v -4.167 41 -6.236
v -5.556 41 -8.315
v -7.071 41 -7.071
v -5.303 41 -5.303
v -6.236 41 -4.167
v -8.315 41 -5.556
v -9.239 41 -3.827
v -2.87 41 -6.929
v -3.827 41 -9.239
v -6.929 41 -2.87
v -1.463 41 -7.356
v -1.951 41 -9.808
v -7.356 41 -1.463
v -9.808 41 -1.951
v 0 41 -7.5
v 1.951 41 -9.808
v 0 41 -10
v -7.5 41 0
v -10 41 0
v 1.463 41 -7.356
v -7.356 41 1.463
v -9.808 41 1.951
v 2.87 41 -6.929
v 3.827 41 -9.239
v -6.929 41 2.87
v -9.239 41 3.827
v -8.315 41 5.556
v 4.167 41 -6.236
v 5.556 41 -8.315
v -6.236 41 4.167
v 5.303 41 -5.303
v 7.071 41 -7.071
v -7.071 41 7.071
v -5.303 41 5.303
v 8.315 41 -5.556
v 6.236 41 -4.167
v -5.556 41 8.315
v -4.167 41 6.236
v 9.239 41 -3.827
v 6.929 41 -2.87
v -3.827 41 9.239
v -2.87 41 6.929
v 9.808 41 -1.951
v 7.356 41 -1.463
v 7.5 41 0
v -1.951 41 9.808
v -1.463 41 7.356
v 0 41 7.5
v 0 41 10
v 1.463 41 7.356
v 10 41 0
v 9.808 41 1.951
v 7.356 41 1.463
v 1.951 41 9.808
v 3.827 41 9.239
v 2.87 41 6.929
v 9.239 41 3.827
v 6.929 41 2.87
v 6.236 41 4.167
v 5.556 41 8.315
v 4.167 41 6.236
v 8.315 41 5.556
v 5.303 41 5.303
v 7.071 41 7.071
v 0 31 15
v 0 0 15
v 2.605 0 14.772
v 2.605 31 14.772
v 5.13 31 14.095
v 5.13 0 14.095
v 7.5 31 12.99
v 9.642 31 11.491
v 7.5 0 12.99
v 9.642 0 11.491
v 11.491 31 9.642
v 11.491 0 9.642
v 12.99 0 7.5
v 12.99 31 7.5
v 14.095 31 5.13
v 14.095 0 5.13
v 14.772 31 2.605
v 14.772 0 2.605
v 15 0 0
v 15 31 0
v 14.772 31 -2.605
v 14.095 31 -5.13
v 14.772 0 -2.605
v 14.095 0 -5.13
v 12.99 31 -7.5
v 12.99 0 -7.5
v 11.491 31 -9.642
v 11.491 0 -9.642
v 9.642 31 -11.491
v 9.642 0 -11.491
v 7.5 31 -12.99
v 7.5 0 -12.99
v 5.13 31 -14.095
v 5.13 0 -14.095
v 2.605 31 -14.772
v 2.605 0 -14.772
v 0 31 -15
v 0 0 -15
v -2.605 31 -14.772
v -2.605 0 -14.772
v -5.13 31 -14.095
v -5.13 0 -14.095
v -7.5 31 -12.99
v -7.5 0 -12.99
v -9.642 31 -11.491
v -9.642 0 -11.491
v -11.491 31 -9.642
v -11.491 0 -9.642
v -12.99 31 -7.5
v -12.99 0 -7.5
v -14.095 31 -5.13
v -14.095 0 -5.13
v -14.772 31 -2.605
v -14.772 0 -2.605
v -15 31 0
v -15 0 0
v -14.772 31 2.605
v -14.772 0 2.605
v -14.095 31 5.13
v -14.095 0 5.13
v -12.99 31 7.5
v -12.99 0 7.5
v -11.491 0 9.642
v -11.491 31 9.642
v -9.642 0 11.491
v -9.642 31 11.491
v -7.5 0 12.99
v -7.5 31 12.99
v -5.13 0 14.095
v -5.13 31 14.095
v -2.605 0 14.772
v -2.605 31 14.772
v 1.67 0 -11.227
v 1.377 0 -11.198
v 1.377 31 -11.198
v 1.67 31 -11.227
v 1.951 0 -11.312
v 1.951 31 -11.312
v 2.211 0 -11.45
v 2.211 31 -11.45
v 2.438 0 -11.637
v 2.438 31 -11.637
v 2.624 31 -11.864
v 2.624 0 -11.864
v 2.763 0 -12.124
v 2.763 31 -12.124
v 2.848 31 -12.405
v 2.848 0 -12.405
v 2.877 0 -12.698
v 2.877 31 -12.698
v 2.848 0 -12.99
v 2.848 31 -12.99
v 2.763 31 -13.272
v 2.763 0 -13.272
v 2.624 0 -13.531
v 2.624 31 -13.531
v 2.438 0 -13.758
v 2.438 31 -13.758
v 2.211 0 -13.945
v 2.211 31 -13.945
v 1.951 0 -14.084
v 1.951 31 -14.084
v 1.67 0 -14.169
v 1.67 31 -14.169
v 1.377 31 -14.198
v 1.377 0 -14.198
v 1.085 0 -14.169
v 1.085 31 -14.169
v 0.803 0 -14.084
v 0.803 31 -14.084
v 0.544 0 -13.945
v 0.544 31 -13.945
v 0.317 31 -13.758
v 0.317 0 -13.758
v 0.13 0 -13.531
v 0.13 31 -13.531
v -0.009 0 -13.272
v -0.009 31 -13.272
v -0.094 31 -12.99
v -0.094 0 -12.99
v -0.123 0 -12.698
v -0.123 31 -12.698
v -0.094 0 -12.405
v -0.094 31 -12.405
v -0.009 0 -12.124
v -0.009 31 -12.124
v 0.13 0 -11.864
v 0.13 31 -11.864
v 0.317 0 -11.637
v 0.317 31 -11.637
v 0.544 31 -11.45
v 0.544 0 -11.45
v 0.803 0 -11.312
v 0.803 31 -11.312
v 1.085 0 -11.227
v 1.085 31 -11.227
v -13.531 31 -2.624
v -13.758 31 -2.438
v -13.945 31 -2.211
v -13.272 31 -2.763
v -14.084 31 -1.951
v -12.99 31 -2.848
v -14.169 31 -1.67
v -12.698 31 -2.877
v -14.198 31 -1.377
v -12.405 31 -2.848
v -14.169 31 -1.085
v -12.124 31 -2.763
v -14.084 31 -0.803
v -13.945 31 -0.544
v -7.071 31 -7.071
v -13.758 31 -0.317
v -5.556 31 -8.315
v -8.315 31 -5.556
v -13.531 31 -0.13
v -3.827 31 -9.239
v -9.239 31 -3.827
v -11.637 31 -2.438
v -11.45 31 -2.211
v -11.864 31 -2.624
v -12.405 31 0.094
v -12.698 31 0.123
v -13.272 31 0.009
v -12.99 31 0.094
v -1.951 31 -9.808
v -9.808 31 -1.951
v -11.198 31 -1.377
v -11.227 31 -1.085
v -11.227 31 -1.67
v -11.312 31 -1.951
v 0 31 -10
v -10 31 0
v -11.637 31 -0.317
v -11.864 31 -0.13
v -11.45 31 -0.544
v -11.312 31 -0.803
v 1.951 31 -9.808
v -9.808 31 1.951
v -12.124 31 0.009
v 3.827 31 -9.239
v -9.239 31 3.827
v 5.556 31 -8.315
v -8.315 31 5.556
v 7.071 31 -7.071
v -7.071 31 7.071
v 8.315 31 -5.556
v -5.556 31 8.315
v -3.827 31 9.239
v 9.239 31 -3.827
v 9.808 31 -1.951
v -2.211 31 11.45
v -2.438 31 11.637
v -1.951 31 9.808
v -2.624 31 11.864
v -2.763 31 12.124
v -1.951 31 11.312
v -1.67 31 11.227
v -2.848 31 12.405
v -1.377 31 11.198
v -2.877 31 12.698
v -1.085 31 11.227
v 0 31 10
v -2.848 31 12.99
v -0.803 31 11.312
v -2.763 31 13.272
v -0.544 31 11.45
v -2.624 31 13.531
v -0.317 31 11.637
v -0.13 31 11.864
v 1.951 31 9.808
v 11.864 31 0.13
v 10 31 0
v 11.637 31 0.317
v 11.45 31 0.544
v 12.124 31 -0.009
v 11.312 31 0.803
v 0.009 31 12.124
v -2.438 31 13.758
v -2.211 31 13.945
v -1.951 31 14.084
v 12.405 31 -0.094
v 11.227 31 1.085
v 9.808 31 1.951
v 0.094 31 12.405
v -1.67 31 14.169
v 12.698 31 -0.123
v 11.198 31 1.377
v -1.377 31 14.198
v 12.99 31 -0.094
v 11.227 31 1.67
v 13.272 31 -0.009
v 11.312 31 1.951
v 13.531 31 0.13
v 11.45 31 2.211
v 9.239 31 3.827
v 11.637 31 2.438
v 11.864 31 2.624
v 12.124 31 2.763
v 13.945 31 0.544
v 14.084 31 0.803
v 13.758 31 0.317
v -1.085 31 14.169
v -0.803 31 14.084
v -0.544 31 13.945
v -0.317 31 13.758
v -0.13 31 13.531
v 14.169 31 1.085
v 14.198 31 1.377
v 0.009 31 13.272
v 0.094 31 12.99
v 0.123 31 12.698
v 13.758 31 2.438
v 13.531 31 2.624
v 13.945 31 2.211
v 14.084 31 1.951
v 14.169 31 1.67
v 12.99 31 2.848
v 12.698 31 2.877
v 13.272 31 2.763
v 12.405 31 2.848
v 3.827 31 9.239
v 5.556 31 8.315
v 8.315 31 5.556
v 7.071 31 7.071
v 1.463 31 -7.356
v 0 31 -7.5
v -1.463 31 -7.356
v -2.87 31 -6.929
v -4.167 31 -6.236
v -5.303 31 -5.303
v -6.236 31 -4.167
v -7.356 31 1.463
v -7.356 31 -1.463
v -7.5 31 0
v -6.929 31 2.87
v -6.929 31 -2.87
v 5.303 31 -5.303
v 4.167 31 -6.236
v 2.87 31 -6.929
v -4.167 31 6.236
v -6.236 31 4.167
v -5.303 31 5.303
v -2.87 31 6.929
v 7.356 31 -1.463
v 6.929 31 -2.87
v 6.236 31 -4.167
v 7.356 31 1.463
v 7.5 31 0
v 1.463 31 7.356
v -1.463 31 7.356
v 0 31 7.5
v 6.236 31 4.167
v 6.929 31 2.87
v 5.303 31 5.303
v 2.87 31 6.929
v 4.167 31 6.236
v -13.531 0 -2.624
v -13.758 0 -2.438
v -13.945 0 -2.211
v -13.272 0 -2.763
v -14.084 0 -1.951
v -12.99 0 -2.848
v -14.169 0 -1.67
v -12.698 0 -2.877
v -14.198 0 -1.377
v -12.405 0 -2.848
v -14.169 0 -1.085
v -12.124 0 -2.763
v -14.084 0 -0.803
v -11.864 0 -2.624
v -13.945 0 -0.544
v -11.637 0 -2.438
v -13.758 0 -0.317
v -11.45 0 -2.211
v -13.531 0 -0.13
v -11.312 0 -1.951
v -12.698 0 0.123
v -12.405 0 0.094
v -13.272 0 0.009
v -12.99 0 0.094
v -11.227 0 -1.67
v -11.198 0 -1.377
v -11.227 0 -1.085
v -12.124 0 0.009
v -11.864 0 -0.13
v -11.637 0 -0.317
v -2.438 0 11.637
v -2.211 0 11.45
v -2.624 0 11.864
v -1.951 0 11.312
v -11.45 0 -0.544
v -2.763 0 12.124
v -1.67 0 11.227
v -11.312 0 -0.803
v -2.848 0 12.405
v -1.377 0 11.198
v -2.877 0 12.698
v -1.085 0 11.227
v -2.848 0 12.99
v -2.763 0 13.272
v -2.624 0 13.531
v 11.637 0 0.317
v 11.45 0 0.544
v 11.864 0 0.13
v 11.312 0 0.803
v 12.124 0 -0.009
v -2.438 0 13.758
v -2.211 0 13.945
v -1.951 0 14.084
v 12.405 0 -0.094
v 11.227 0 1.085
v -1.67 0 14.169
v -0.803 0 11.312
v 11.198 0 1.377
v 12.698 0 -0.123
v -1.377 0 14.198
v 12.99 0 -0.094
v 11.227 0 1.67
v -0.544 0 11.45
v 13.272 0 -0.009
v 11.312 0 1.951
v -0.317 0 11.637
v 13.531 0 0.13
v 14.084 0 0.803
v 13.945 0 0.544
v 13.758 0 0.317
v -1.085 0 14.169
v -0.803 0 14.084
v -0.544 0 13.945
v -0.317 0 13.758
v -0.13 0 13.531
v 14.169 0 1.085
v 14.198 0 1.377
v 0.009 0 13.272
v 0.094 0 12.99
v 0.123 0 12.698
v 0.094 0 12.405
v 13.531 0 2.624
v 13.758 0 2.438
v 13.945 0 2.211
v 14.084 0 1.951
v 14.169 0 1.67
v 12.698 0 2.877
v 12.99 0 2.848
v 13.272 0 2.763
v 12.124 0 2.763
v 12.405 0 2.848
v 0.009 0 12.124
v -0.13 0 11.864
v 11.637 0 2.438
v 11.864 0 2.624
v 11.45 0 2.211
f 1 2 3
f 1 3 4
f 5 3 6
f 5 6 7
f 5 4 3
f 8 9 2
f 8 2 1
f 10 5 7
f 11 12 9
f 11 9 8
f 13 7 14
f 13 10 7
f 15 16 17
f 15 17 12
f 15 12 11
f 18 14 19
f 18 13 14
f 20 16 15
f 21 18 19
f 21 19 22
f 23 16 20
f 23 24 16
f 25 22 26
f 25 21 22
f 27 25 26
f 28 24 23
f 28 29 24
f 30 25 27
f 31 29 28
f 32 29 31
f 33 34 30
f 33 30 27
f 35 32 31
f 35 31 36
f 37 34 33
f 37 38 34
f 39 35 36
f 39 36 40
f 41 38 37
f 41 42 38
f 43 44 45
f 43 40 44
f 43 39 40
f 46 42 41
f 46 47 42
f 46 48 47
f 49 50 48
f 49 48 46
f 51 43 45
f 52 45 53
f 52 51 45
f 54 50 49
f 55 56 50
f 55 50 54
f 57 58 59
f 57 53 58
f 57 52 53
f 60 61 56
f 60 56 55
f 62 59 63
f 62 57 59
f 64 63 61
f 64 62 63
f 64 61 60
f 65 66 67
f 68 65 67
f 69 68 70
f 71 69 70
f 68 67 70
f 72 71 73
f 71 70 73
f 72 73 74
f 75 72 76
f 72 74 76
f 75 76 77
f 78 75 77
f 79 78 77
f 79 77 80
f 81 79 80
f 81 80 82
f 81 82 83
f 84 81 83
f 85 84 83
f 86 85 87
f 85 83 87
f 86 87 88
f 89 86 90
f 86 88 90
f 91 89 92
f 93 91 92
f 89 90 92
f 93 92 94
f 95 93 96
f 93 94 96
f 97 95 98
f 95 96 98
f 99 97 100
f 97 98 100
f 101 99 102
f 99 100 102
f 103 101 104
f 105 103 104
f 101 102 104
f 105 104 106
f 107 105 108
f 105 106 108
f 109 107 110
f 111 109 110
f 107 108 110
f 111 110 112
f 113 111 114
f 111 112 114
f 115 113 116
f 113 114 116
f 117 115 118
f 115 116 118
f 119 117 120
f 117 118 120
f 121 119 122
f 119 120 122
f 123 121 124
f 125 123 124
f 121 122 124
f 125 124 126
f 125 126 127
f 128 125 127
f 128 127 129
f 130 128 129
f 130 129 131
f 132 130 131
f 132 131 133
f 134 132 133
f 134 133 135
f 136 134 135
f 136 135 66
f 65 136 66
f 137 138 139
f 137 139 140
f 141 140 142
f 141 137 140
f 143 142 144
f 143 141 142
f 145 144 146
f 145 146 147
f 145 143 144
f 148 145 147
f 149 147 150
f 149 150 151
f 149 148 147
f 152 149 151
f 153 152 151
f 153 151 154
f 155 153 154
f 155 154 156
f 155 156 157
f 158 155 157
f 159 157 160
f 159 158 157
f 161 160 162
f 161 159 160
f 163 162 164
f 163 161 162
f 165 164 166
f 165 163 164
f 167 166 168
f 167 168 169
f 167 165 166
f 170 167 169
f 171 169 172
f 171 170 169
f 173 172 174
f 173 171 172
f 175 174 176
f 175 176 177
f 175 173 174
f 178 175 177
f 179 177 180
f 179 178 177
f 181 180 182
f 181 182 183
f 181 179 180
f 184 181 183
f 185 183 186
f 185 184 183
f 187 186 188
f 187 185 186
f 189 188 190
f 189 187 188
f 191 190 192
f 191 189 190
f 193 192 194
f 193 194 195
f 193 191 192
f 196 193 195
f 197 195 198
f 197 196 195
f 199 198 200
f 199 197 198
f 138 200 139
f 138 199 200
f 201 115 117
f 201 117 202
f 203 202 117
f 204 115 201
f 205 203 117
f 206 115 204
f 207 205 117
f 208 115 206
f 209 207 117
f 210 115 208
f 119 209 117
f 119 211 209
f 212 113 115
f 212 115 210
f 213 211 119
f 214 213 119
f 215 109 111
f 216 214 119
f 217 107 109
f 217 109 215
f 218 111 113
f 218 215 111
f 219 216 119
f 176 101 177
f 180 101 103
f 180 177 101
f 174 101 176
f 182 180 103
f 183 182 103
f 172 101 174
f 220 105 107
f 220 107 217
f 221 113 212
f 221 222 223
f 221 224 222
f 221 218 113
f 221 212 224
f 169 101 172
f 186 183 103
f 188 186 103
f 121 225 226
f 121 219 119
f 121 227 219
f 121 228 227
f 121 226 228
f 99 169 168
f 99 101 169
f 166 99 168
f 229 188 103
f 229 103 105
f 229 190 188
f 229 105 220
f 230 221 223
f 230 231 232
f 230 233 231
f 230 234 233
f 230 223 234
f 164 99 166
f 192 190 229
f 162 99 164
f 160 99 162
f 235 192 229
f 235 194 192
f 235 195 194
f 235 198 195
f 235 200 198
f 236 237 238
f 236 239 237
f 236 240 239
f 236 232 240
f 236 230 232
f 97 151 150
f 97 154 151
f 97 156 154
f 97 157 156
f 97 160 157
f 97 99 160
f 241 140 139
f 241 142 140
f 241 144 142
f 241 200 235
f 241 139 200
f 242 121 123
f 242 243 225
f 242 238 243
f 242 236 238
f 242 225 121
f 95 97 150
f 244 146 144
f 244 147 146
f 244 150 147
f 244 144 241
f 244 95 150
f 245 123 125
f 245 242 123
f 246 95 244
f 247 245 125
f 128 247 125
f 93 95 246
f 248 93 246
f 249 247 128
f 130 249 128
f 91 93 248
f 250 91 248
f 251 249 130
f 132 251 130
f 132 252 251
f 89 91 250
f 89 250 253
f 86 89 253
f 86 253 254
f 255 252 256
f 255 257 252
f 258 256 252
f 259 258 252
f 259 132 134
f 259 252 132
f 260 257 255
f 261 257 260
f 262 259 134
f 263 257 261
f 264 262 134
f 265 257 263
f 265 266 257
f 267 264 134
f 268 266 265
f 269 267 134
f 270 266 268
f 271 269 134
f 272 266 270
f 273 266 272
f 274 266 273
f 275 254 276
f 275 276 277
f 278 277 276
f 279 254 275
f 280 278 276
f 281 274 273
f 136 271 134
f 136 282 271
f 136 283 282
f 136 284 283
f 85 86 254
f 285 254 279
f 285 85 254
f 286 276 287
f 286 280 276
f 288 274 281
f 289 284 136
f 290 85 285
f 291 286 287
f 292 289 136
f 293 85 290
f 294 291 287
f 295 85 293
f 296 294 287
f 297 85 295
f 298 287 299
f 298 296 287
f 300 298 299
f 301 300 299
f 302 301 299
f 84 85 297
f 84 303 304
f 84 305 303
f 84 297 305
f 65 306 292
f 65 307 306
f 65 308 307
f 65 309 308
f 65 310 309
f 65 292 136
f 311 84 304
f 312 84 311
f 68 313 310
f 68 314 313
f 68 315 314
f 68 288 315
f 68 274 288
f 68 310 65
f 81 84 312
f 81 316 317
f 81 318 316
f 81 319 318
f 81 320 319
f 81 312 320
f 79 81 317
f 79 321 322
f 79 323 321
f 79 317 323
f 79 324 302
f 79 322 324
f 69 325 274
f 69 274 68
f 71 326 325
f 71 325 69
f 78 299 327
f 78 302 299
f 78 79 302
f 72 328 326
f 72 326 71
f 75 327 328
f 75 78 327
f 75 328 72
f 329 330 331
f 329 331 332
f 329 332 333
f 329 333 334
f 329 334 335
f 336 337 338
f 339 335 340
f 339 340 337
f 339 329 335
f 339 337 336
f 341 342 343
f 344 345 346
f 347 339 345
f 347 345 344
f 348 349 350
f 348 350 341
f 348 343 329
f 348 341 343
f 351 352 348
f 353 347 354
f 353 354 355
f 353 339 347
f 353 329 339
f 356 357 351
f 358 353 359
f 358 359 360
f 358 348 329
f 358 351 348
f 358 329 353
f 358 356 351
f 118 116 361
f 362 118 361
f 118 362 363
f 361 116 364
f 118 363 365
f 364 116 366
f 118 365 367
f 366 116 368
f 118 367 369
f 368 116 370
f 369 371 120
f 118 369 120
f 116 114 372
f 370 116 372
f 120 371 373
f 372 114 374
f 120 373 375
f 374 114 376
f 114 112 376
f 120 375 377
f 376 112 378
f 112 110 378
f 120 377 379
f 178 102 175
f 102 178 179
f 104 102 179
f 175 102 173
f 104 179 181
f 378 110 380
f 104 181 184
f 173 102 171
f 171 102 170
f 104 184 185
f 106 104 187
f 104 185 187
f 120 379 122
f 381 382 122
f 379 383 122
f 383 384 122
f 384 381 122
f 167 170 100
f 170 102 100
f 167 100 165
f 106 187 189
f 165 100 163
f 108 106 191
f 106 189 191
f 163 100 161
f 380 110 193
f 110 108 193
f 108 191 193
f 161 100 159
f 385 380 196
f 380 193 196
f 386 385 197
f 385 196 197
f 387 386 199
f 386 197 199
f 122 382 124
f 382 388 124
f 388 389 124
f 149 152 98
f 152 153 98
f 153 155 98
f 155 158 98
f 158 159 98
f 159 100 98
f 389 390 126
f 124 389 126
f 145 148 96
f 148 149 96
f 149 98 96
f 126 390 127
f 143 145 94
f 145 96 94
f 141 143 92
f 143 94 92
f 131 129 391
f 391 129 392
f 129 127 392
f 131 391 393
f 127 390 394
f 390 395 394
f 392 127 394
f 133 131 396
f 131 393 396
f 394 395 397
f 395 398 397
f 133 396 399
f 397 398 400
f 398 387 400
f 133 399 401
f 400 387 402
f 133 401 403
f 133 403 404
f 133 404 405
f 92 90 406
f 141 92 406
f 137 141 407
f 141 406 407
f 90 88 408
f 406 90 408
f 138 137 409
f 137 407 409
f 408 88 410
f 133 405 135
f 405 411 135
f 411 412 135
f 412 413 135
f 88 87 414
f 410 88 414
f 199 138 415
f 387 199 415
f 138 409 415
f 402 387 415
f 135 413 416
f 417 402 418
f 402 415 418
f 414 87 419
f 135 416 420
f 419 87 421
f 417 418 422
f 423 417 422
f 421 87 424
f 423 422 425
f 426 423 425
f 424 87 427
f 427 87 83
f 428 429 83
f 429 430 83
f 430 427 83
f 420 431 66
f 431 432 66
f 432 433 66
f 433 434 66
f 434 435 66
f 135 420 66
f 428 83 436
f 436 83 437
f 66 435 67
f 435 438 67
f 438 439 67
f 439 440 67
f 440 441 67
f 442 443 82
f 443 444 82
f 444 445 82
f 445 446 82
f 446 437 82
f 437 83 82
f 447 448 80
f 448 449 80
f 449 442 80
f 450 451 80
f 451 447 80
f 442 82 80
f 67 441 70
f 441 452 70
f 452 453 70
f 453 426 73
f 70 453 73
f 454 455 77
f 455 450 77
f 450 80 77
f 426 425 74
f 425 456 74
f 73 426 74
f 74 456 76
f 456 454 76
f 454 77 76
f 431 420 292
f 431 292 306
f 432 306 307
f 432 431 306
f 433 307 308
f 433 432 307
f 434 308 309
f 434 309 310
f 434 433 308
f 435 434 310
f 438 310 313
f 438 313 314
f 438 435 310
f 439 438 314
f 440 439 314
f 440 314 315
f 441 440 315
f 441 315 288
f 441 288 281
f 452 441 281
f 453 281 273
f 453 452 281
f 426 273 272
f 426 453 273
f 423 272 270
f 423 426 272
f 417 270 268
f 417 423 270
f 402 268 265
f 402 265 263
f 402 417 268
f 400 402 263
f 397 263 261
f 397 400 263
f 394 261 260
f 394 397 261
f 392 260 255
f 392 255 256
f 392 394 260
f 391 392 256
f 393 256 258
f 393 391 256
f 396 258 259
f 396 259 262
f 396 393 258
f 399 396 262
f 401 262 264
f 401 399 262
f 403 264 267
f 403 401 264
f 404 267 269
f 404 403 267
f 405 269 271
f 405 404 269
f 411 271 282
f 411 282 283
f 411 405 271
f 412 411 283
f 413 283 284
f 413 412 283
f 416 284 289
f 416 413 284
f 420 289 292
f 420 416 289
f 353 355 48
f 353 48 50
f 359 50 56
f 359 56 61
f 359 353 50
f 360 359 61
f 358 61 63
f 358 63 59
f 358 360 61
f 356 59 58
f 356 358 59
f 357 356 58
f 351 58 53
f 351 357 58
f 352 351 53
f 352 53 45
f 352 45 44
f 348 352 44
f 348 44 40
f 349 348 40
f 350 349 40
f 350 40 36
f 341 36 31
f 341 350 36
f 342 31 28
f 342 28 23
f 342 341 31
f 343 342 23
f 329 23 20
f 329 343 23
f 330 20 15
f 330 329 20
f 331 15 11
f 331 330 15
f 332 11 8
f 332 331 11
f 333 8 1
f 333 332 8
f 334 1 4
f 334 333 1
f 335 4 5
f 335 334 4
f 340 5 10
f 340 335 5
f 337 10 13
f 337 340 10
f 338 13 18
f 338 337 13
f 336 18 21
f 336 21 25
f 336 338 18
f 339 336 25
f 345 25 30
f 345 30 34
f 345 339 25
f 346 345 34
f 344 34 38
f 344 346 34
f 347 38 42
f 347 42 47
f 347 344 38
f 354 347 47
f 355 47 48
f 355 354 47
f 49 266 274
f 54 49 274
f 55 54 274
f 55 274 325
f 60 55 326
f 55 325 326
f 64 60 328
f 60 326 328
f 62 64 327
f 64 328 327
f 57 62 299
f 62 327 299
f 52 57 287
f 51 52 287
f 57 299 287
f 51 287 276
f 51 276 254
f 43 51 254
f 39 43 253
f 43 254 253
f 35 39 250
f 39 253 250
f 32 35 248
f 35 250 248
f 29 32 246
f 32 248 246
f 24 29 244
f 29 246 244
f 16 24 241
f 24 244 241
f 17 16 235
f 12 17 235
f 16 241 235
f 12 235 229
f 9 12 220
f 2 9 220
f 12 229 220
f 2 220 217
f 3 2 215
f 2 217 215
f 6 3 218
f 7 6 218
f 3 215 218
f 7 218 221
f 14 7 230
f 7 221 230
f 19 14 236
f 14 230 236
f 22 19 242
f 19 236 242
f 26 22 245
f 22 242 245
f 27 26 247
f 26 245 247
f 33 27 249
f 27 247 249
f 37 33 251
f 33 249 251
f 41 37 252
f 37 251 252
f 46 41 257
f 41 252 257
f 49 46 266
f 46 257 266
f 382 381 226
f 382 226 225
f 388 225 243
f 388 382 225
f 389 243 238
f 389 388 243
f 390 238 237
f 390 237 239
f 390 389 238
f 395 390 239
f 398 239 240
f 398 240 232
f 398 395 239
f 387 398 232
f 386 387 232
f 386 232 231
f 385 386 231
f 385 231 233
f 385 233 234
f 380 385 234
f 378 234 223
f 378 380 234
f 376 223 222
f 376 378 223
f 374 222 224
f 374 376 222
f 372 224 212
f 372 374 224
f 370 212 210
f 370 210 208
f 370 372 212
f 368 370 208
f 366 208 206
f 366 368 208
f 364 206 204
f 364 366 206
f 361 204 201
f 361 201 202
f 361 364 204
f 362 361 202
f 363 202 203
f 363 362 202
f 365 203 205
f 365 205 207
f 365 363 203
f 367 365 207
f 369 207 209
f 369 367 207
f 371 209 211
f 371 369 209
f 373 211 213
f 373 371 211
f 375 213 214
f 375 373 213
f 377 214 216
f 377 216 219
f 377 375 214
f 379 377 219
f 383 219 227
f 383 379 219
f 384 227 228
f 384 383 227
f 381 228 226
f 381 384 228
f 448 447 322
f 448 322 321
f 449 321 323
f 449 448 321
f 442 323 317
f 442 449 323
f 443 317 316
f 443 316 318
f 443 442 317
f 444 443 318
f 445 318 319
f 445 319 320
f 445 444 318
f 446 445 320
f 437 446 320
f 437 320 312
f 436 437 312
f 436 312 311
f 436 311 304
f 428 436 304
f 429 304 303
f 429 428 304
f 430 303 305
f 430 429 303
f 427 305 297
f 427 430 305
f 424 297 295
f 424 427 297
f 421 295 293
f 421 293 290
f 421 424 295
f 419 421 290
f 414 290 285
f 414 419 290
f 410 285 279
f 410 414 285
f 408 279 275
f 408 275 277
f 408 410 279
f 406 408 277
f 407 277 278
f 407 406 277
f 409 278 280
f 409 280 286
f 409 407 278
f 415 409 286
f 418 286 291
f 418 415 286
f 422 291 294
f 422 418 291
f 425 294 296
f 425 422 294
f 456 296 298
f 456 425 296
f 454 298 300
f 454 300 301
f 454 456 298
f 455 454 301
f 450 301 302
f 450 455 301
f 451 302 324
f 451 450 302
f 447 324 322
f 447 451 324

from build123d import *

# Parameters (mm, degrees)
SKETCH1_R           = 15
SKETCH1_R_2         = 1.5
BOSS_EXTRUDE1_DEPTH = 31
SKETCH2_R           = 10
SKETCH2_R_2         = 7.5
BOSS_EXTRUDE2_DEPTH = 10


with BuildPart() as part:
    # Sketch1 → Boss-Extrude1 (new body)
    with BuildSketch(Plane(origin=(0, 0, 0), x_dir=(1, 0, 0), z_dir=(0, 1, 0))):
        with Locations(Location((0, 0, 0), (0, 0, 270))):
            Circle(SKETCH1_R)
        with Locations(Location((-12.697691575, 1.377182715, 0), (0, 0, 270))):
            Circle(SKETCH1_R_2, mode=Mode.SUBTRACT)
        with Locations(Location((1.377182715, 12.697691575, 0), (0, 0, 270))):
            Circle(SKETCH1_R_2, mode=Mode.SUBTRACT)
        with Locations(Location((12.697691575, -1.377182715, 0), (0, 0, 270))):
            Circle(SKETCH1_R_2, mode=Mode.SUBTRACT)
        with Locations(Location((-1.377182715, -12.697691575, 0), (0, 0, 270))):
            Circle(SKETCH1_R_2, mode=Mode.SUBTRACT)
    extrude(amount=BOSS_EXTRUDE1_DEPTH)

    # Sketch2 → Boss-Extrude2 (add)
    with BuildSketch(Plane(origin=(0, 31, 0), x_dir=(1, 0, 0), z_dir=(0, 1, 0))):
        with Locations(Location((0, 0, 0), (0, 0, 270))):
            Circle(SKETCH2_R)
        with Locations(Location((0, 0, 0), (0, 0, 270))):
            Circle(SKETCH2_R_2, mode=Mode.SUBTRACT)
    extrude(amount=BOSS_EXTRUDE2_DEPTH)


solid = part.part
